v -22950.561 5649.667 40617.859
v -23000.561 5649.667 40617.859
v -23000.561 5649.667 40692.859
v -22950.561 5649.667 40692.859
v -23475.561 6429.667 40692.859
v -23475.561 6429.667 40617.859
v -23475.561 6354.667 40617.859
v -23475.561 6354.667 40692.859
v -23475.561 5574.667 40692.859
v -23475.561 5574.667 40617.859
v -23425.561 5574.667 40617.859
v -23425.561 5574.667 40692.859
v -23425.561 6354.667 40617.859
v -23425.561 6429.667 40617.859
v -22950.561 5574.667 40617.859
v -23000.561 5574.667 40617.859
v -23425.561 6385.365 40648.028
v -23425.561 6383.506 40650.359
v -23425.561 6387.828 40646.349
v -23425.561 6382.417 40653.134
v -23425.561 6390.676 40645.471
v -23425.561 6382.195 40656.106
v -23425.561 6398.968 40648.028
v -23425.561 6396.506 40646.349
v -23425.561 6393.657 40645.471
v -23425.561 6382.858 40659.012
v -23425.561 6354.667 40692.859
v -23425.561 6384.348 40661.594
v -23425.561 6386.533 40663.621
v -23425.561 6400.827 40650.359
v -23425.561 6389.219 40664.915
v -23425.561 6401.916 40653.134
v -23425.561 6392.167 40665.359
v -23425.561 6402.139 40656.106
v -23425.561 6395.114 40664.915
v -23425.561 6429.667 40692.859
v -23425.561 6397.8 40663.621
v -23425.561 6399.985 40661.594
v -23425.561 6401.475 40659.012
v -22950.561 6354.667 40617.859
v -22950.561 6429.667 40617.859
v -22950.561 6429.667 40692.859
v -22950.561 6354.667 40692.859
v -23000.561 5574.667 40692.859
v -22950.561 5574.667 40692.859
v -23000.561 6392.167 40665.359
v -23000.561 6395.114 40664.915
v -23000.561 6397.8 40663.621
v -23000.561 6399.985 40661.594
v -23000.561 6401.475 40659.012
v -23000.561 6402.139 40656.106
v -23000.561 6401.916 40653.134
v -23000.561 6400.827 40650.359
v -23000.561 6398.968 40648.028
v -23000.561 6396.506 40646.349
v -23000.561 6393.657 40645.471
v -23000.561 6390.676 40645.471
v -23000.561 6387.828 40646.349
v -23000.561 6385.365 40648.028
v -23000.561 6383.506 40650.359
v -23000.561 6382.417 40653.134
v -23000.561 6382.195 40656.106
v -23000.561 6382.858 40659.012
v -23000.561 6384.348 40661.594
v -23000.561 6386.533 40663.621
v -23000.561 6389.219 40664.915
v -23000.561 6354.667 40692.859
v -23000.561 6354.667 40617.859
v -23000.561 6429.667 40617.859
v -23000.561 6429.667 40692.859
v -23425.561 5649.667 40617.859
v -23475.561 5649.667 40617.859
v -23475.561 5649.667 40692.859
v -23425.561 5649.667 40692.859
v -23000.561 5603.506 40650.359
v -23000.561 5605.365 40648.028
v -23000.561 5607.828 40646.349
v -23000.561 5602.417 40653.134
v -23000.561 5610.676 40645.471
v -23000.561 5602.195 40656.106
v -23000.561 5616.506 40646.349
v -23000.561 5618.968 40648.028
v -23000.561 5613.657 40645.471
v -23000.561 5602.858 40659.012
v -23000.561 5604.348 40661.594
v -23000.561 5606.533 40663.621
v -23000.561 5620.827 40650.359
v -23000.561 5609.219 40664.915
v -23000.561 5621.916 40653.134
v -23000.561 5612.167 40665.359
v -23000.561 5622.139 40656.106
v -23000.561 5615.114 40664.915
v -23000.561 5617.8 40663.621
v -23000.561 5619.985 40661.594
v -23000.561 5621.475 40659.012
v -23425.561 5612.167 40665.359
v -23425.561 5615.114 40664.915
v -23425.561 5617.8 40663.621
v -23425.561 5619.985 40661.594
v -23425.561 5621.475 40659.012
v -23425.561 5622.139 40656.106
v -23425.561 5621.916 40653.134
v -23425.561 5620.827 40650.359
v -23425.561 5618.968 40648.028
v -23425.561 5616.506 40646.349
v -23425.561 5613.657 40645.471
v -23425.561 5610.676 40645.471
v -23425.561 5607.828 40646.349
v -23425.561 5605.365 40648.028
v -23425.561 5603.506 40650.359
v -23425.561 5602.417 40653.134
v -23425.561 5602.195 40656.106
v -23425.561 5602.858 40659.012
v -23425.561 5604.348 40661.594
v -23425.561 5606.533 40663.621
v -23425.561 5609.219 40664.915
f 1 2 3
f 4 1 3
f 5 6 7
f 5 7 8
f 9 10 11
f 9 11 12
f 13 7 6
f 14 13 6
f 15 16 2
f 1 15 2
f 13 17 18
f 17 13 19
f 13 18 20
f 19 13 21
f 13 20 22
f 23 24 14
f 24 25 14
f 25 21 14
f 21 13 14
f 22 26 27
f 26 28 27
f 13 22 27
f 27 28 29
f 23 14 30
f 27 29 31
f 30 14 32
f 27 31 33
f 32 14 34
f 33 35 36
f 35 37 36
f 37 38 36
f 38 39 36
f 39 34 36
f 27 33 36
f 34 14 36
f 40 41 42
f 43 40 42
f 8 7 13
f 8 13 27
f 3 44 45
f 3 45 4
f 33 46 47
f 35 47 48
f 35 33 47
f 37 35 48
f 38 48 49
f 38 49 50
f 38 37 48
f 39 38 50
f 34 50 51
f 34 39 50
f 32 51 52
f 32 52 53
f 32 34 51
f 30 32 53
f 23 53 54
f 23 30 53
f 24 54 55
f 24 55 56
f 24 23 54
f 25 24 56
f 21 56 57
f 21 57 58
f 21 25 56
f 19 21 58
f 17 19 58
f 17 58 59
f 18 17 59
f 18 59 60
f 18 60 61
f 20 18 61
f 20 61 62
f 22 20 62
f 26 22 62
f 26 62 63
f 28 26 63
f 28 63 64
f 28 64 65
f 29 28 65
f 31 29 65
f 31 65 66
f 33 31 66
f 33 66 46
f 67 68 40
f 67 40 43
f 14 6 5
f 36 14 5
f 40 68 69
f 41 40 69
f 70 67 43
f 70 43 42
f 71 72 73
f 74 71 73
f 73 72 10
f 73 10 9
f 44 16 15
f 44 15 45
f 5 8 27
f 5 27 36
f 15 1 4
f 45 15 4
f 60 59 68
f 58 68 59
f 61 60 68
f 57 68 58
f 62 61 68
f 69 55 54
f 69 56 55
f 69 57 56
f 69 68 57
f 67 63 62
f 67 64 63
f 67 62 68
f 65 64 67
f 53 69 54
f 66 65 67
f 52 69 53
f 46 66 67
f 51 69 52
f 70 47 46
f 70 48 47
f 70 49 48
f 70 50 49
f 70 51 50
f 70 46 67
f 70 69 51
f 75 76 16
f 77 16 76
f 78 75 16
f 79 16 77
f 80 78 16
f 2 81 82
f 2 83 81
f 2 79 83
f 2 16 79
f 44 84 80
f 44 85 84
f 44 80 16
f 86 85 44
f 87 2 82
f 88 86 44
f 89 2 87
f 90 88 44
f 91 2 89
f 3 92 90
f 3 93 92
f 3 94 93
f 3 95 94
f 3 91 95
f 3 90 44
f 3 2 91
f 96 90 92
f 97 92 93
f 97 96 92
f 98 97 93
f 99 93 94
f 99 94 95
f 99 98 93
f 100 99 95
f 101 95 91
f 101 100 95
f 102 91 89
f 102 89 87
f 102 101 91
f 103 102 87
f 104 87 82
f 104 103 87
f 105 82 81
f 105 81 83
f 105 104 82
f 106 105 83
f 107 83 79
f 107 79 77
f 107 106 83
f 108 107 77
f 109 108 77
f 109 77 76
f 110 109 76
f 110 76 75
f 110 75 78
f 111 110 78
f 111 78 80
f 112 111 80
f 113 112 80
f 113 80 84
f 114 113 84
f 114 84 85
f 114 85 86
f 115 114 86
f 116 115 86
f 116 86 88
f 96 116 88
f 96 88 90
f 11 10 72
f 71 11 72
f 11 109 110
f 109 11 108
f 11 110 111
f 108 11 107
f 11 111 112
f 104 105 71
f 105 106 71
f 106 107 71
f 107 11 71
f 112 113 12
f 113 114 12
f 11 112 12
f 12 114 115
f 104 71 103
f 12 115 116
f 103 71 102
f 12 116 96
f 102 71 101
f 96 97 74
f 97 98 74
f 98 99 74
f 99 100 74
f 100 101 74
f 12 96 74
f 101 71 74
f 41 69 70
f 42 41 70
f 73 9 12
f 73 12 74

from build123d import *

# Parameters (mm, degrees)
SKETCH1_W           = 75
SKETCH1_H           = 75
SKETCH1_R           = 10
BOSS_EXTRUDE1_DEPTH = 50
LPATTERN1_COUNT     = 2
LPATTERN1_PITCH     = 475
SKETCH2_R           = 10
BOSS_EXTRUDE2_DEPTH = 525
LPATTERN2_COUNT     = 2
LPATTERN2_PITCH     = 780


with BuildPart() as part:
    # Sketch1 → Boss-Extrude1 (new body)
    with BuildSketch(Plane.ZY.offset(23475.561141738)):
        with Locations((40655.358832434, 5612.166693368)):
            Rectangle(SKETCH1_W, SKETCH1_H)
        with Locations((40655.358832434, 5612.166693368)):
            Circle(SKETCH1_R, mode=Mode.SUBTRACT)
    extrude(amount=-BOSS_EXTRUDE1_DEPTH)


with BuildPart() as lpattern1_1:
    # LPattern1: pattern copy
    add(part.part.moved(Location(Vector(1, 0, 0) * (1 * LPATTERN1_PITCH))))


with BuildPart() as part_1:
    add(part.part)

    add(lpattern1_1.part)  # Boss-Extrude2 merges LPattern1_1
    # Sketch2 → Boss-Extrude2 (add)
    with BuildSketch(Plane.ZY.offset(23475.561141738)):
        with Locations((40655.358832434, 5612.166693368)):
            Circle(SKETCH2_R)
    extrude(amount=-BOSS_EXTRUDE2_DEPTH)


with BuildPart() as lpattern2_1:
    # LPattern2: pattern copy
    add(part_1.part.moved(Location(Vector(0, 1, 0) * (1 * LPATTERN2_PITCH))))


solid = Compound([part_1.part, lpattern2_1.part])
